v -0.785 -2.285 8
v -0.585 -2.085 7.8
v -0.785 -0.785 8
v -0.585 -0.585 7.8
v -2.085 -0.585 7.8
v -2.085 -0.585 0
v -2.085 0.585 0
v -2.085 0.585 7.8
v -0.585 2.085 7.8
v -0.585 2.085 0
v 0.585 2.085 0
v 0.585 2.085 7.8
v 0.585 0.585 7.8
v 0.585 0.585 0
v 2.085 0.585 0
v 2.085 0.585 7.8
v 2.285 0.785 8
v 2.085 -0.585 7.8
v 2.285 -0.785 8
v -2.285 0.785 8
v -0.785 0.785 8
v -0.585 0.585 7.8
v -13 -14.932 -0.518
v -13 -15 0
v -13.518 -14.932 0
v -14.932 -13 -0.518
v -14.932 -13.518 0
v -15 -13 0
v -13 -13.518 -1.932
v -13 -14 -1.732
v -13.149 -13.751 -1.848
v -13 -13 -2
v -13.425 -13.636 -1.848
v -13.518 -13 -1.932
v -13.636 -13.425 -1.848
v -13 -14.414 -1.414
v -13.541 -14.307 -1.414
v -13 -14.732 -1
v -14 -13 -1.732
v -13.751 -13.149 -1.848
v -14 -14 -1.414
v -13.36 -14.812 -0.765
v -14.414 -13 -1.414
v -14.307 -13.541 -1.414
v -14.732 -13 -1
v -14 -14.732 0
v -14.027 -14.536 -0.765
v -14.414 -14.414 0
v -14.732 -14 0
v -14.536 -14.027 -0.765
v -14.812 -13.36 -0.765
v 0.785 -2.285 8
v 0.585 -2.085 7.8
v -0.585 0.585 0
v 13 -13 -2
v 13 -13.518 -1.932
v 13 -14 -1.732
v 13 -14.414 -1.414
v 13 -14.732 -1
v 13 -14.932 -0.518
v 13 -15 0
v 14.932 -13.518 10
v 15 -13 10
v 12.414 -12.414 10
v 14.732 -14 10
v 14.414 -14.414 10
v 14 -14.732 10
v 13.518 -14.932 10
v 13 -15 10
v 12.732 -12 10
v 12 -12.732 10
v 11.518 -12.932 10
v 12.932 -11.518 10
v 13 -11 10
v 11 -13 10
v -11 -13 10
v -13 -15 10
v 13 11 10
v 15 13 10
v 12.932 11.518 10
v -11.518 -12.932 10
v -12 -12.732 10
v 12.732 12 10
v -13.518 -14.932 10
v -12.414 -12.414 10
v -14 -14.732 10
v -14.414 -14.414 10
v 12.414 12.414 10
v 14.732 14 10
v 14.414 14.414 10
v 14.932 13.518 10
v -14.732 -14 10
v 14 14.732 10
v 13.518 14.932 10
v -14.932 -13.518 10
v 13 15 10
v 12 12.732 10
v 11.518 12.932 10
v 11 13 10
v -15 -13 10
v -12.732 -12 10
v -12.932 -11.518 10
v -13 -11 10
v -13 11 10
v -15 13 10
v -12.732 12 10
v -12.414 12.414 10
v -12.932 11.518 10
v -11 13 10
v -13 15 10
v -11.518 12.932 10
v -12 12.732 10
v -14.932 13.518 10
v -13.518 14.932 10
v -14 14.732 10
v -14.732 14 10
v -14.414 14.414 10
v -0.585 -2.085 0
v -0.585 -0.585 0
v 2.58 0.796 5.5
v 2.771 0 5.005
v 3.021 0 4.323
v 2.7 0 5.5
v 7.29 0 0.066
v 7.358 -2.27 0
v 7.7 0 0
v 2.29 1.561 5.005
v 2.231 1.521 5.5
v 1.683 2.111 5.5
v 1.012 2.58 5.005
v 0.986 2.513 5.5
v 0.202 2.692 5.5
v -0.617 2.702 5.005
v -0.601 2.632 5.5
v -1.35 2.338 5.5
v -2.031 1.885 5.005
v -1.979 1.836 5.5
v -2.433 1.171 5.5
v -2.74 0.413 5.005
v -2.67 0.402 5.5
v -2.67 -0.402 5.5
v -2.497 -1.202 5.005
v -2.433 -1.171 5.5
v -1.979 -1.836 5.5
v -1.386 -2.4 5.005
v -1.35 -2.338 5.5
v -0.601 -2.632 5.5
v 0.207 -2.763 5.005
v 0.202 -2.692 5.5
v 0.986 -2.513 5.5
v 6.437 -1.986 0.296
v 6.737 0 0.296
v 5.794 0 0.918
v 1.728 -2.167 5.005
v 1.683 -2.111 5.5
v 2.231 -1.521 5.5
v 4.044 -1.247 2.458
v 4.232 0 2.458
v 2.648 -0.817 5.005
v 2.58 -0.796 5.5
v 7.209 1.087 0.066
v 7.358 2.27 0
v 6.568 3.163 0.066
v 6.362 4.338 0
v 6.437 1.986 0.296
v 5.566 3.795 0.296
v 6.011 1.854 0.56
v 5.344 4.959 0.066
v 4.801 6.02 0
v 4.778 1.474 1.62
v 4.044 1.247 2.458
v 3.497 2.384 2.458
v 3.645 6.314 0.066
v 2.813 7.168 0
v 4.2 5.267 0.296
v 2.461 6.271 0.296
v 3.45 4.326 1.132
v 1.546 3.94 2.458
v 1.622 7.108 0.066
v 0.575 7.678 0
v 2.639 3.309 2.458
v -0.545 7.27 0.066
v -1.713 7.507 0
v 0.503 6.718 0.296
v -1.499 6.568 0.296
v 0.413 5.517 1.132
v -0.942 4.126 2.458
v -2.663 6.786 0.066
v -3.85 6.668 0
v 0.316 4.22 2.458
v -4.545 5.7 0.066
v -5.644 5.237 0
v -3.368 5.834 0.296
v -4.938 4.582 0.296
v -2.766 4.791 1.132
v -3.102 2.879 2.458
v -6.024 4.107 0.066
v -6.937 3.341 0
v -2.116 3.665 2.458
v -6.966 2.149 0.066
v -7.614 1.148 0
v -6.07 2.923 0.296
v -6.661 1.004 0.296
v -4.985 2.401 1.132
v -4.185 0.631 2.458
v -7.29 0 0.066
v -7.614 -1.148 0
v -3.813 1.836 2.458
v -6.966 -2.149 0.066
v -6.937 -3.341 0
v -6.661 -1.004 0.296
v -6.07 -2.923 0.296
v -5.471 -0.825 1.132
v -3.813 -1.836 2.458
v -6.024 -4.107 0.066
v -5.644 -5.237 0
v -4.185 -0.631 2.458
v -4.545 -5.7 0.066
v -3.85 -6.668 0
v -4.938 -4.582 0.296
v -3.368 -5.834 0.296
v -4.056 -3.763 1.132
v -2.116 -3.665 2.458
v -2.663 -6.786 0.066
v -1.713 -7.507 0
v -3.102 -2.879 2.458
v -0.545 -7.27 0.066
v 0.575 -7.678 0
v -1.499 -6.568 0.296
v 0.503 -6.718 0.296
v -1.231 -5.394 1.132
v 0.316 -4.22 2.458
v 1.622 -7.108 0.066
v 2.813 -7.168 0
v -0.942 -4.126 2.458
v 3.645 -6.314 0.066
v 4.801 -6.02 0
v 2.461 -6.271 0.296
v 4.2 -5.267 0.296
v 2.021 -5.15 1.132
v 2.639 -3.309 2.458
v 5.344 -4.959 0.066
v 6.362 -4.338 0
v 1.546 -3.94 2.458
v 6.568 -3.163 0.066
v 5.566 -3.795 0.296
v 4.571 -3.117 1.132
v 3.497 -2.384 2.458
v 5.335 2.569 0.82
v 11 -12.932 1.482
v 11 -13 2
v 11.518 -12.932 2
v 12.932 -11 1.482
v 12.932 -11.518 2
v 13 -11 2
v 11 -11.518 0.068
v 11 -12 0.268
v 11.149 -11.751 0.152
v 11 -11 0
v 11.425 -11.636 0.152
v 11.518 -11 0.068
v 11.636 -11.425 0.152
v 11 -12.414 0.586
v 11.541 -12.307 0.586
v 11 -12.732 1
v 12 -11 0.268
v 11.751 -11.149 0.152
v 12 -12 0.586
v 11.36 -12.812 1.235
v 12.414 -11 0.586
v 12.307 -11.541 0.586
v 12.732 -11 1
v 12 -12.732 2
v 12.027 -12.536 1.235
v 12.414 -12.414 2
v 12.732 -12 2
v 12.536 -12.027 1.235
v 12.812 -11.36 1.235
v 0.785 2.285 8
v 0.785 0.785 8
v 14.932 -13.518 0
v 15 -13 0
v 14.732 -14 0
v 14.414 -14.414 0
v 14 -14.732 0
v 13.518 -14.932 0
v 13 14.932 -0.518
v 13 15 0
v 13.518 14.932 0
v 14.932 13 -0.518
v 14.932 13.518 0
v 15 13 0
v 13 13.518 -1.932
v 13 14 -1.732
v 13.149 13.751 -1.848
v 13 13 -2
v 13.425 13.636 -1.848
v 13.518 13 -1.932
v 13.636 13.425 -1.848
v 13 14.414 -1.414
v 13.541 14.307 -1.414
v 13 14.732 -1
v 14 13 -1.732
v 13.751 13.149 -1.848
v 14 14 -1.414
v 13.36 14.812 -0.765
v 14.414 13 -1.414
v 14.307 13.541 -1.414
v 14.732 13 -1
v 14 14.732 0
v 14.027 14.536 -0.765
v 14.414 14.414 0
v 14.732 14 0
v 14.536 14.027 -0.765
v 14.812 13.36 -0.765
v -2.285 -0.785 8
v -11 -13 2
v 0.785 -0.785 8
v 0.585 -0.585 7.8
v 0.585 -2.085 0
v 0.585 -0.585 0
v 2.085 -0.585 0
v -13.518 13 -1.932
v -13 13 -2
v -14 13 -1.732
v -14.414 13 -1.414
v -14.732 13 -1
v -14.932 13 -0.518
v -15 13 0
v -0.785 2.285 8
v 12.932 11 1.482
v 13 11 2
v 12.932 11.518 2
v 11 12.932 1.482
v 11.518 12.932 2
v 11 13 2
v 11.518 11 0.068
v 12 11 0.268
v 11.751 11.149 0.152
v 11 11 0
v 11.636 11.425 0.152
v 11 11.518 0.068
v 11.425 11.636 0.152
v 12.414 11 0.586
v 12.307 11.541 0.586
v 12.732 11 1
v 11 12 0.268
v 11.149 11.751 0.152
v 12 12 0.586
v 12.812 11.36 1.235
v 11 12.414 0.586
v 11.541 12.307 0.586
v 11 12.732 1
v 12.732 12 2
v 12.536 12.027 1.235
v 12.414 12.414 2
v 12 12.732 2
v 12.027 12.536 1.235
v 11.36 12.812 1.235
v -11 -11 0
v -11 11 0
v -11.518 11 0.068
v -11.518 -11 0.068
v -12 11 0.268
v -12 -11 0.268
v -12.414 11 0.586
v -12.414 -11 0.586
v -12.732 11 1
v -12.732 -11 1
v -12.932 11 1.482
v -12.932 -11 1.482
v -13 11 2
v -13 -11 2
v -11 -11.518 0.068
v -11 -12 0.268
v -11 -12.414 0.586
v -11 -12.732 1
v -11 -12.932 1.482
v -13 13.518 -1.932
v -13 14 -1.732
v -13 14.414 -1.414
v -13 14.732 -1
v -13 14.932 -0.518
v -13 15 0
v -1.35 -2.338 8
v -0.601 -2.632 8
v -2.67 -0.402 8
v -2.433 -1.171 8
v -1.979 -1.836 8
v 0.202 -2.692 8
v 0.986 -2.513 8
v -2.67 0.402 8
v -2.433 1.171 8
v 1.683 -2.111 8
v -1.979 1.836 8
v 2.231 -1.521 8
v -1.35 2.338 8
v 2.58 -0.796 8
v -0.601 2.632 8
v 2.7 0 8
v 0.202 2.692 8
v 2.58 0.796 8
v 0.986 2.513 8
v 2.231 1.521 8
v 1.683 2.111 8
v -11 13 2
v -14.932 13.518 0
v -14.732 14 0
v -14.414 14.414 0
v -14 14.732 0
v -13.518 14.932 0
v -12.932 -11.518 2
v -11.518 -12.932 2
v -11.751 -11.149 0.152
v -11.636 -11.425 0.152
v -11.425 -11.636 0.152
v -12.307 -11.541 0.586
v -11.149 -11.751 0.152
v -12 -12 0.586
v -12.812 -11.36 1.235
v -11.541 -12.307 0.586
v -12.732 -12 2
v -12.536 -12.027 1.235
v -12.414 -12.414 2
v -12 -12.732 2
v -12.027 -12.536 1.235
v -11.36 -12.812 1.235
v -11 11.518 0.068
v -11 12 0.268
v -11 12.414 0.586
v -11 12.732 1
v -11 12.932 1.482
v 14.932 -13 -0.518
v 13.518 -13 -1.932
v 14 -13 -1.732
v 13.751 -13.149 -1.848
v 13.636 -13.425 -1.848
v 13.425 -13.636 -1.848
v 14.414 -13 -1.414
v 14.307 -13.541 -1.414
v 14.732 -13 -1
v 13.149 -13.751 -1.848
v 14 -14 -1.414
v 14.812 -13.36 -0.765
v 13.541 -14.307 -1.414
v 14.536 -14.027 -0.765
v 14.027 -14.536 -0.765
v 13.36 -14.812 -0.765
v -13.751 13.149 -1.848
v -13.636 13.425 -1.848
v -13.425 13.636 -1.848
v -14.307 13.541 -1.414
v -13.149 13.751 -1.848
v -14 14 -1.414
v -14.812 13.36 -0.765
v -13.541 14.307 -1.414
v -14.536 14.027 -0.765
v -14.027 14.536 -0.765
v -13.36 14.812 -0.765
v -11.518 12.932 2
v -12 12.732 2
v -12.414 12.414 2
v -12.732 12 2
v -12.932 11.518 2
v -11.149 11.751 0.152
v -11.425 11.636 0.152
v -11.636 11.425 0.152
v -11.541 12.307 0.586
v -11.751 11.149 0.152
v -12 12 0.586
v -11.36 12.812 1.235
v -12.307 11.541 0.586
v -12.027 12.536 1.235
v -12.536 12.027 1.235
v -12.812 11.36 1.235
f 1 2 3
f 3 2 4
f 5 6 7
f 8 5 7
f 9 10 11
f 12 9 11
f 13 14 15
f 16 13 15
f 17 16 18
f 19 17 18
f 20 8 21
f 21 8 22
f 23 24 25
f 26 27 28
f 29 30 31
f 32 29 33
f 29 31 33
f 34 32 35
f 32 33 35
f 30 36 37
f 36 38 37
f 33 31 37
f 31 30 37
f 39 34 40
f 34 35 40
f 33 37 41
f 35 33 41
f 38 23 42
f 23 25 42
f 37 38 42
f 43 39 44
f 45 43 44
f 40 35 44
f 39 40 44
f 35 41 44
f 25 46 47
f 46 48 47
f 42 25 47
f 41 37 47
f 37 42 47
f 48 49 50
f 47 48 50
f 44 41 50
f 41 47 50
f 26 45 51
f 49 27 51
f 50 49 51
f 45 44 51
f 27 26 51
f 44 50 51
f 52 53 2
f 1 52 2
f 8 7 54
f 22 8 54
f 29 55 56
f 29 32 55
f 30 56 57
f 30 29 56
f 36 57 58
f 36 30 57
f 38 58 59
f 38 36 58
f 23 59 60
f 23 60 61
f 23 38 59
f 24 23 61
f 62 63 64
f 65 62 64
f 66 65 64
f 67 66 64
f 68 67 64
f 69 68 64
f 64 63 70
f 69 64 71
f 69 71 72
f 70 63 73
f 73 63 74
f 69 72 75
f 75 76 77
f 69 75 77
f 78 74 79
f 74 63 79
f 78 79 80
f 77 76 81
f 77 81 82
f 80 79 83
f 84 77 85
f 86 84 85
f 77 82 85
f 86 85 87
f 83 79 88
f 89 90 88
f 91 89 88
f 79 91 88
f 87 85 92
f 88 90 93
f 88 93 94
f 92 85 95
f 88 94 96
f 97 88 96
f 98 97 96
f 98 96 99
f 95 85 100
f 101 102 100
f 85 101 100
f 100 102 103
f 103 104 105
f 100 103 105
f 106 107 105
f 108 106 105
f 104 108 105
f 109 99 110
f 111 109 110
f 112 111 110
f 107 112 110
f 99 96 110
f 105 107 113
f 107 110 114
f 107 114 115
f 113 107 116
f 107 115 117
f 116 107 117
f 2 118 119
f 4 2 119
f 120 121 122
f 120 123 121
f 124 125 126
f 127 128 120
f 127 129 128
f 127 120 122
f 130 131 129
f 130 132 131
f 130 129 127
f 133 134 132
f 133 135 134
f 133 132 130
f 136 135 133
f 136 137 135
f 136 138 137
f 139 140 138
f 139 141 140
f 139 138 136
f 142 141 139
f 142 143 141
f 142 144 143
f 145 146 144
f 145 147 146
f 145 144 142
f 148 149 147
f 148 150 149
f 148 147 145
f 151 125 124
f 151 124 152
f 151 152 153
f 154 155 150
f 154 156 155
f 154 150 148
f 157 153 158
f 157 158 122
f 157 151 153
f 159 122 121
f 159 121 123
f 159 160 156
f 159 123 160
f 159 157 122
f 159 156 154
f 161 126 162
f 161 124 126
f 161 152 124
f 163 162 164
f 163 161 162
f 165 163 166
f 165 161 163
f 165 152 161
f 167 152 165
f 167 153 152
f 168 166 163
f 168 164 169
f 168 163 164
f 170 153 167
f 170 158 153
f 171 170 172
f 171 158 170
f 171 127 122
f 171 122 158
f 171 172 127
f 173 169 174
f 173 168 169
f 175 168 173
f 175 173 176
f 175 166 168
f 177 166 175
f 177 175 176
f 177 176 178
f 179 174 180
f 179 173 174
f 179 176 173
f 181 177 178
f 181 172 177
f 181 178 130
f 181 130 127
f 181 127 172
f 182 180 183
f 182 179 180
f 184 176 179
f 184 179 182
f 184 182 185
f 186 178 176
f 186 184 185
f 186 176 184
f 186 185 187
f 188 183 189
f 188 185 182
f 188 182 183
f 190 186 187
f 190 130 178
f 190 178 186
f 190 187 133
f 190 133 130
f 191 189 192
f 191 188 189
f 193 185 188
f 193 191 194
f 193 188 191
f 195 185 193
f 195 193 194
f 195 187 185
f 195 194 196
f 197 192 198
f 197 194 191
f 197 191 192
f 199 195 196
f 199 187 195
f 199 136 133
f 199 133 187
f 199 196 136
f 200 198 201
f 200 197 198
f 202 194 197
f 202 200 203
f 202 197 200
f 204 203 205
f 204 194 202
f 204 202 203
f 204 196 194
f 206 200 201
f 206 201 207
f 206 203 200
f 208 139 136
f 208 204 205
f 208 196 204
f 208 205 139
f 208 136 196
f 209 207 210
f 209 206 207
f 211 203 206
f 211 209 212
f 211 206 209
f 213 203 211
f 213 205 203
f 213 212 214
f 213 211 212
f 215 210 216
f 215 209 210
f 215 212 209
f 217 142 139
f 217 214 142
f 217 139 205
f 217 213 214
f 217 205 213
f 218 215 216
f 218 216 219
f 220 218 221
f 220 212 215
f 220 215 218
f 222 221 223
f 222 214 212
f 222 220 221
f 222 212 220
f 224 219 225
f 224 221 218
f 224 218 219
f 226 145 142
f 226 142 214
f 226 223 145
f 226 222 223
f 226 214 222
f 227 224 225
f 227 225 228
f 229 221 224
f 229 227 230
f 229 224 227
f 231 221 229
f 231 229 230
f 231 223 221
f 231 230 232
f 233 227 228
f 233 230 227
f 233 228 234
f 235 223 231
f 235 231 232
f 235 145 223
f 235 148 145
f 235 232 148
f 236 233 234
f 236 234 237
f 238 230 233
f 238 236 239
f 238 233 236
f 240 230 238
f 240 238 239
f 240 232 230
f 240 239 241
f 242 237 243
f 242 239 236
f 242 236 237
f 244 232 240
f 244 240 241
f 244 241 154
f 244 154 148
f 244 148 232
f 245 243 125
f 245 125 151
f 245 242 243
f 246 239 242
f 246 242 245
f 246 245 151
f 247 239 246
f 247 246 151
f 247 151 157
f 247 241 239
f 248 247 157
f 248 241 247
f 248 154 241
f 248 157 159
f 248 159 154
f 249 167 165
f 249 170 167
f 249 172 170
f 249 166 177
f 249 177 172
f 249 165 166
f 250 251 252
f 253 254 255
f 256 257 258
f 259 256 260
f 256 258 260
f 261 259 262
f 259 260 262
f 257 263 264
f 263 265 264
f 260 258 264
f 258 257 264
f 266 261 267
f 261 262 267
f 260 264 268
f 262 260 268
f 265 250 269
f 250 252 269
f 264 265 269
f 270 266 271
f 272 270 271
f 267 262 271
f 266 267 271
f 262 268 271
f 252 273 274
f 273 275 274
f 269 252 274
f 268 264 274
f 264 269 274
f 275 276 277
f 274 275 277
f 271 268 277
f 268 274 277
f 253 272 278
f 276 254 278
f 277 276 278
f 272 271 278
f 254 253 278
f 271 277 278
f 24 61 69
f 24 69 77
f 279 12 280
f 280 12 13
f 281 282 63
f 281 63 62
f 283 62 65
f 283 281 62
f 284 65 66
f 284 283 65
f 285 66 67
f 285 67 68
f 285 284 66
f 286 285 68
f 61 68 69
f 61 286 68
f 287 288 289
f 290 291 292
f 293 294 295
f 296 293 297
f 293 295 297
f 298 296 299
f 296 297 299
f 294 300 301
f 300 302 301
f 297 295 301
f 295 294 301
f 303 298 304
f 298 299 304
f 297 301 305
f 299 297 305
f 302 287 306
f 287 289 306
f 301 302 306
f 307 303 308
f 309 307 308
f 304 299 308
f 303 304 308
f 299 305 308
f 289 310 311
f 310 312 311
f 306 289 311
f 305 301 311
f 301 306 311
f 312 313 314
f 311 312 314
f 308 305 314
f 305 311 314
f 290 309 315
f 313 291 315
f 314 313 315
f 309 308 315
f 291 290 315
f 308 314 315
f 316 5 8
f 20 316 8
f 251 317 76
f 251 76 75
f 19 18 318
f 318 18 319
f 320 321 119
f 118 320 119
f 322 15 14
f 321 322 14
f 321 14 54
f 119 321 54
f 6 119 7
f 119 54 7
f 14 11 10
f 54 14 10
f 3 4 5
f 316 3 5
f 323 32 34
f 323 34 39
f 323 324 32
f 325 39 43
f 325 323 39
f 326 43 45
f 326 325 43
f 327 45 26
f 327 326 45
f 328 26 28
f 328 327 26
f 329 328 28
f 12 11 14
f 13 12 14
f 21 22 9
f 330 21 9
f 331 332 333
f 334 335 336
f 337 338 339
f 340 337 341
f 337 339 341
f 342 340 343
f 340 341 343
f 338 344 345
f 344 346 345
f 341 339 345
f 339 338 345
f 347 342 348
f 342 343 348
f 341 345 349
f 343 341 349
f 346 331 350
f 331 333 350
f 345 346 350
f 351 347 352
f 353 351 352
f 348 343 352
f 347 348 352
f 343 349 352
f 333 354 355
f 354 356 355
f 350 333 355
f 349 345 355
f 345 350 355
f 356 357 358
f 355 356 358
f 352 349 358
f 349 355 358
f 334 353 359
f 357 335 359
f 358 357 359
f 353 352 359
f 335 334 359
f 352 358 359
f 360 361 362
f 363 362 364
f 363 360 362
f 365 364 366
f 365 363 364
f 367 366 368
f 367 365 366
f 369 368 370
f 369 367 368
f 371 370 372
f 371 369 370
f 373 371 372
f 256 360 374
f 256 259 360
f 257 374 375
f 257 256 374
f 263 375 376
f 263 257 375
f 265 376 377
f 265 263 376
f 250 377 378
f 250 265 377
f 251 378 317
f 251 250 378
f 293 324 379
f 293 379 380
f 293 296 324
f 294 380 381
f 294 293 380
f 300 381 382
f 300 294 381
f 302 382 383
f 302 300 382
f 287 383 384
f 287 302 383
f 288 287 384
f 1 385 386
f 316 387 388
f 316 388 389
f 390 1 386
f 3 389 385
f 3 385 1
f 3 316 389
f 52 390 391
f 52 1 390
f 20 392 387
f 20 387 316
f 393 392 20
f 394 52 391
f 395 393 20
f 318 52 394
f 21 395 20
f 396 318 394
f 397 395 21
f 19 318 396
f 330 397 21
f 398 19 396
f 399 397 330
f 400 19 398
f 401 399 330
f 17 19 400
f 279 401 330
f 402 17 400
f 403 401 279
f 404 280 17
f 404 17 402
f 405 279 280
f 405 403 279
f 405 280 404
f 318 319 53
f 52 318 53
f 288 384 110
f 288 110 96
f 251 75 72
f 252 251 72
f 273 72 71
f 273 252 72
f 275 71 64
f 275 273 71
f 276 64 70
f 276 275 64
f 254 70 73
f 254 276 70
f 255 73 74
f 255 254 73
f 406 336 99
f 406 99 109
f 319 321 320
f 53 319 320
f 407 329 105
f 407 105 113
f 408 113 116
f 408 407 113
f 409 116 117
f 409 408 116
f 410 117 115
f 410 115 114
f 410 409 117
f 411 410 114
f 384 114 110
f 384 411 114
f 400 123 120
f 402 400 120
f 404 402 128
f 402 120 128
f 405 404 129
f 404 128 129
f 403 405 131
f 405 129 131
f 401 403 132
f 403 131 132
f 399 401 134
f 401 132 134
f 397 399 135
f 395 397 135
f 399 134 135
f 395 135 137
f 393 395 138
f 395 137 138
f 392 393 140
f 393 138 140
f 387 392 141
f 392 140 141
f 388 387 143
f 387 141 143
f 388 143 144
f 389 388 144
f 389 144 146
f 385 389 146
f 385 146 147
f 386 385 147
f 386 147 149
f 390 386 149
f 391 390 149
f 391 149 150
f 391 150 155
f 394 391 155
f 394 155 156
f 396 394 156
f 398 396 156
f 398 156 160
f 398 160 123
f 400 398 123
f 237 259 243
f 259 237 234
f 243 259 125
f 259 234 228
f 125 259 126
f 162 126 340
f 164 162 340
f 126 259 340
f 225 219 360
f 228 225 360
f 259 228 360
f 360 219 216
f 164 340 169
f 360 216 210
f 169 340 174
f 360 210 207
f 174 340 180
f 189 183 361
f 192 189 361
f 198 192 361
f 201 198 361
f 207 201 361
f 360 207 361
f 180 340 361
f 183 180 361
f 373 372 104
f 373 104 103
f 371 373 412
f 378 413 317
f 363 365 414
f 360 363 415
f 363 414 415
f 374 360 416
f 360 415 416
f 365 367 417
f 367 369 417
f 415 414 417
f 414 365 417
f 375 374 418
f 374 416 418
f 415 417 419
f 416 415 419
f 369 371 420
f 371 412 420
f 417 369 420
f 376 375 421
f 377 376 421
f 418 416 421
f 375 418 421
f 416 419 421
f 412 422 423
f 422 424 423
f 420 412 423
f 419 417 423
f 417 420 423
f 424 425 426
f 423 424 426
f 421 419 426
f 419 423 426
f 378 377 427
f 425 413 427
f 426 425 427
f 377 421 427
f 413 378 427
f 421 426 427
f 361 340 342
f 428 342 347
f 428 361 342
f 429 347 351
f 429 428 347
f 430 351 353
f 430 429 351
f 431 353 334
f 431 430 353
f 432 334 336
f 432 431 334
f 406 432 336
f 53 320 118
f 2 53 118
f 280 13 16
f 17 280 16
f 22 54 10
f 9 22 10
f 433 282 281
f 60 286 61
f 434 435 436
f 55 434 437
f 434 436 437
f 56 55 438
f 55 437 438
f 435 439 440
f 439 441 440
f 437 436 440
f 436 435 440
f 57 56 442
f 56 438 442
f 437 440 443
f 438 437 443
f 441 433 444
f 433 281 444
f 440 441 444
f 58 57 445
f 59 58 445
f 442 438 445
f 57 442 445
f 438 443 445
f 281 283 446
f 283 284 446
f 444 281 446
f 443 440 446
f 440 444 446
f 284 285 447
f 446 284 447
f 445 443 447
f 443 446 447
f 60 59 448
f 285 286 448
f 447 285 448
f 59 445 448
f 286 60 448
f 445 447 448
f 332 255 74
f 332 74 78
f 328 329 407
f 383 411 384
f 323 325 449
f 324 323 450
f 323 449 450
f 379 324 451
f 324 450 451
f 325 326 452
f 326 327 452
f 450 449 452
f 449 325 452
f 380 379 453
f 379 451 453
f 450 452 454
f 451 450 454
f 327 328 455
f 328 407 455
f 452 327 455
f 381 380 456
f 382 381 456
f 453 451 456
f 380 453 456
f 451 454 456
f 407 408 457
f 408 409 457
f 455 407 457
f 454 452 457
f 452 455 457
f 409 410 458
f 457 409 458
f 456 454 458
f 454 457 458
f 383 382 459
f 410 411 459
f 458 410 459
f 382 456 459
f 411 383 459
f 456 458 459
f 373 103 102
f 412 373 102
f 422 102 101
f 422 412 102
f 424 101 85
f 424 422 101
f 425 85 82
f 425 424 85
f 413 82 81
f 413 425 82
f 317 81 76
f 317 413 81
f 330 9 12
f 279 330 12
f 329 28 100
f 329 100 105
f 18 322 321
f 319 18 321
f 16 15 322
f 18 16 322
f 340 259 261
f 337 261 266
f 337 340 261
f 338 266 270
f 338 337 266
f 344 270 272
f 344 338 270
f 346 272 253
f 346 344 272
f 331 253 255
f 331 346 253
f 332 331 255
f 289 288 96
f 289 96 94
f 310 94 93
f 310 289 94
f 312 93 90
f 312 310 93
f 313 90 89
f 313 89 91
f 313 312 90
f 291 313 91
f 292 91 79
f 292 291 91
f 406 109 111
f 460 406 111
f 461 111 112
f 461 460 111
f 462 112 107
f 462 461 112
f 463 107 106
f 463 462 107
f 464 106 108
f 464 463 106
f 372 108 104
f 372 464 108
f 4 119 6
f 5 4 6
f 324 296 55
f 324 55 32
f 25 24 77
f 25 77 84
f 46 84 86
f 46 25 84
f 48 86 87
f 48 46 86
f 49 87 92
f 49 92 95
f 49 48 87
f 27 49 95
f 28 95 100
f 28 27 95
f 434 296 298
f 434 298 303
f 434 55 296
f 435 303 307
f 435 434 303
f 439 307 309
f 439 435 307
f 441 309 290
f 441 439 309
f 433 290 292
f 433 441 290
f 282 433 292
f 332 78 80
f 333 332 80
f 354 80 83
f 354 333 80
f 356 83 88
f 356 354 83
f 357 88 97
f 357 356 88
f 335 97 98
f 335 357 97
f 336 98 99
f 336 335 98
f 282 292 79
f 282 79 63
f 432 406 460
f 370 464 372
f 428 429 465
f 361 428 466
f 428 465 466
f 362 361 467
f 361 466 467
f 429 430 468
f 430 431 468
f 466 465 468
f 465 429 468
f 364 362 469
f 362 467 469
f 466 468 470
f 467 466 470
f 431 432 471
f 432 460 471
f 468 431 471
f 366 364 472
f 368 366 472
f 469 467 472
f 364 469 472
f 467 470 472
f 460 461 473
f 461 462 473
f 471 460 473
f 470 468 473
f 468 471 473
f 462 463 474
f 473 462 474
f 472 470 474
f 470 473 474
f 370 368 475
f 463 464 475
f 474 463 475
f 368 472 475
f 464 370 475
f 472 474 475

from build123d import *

# Parameters (mm, degrees)
EXTRUDE_1_DEPTH = 10
SKETCH_1_6_R    = 2.7
EXTRUDE_2_DEPTH = 8
EXTRUDE_START   = -2
EXTRUDE_3_DEPTH = 2
FILLET_1_R      = 2
CHAMFER_1_SIZE  = 0.2
FILLET_2_R      = 2
FILLET_3_SIZE   = 5
FILLET_3_SIZE_2 = 5.5


with BuildPart() as part:
    # 草图1 → 凸台-拉伸1 (new body)
    with BuildSketch(Plane.XY):
        with BuildLine():
            ThreePointArc((-15, 13), (-14.414213562, 14.414213562), (-13, 15))
            Line((-13, 15), (13, 15))
            ThreePointArc((13, 15), (14.414213562, 14.414213562), (15, 13))
            Line((15, 13), (15, -13))
            ThreePointArc((15, -13), (14.414213562, -14.414213562), (13, -15))
            Line((13, -15), (-13, -15))
            ThreePointArc((-13, -15), (-14.414213562, -14.414213562), (-15, -13))
            Line((-15, -13), (-15, 13))
        make_face()
        with BuildLine():
            ThreePointArc((-13, -11), (-12.414213562, -12.414213562), (-11, -13))
            Line((-11, -13), (11, -13))
            ThreePointArc((11, -13), (12.414213562, -12.414213562), (13, -11))
            Line((13, -11), (13, 11))
            ThreePointArc((13, 11), (12.414213562, 12.414213562), (11, 13))
            Line((11, 13), (-11, 13))
            ThreePointArc((-11, 13), (-12.414213562, 12.414213562), (-13, 11))
            Line((-13, 11), (-13, -11))
        make_face(mode=Mode.SUBTRACT)
    extrude(amount=EXTRUDE_1_DEPTH)



with BuildPart() as body_2:
    # 草图1<6> → 凸台-拉伸2 (new body)
    with BuildSketch(Plane.XY):
        Circle(SKETCH_1_6_R)
        Polygon((-2.085, -0.585), (-2.085, 0.585), (-0.585, 0.585), (-0.585, 2.085), (0.585, 2.085), (0.585, 0.585), (2.085, 0.585), (2.085, -0.585), (0.585, -0.585), (0.585, -2.085), (-0.585, -2.085), (-0.585, -0.585), align=None, mode=Mode.SUBTRACT)
    extrude(amount=EXTRUDE_2_DEPTH)


with BuildPart() as part_1:
    add(part.part)

    add(body_2.part)  # 凸台-拉伸3 merges body 2
    # 草图1<7> → 凸台-拉伸3 (add)
    with BuildSketch(Plane.XY.offset(EXTRUDE_START)):
        with BuildLine():
            Line((-13, 15), (13, 15))
            ThreePointArc((13, 15), (14.414213562, 14.414213562), (15, 13))
            Line((15, 13), (15, -13))
            ThreePointArc((15, -13), (14.414213562, -14.414213562), (13, -15))
            Line((13, -15), (-13, -15))
            ThreePointArc((-13, -15), (-14.414213562, -14.414213562), (-15, -13))
            Line((-15, -13), (-15, 13))
            ThreePointArc((-15, 13), (-14.414213562, 14.414213562), (-13, 15))
        make_face()
    extrude(amount=EXTRUDE_3_DEPTH)

    # 圆角1
    fillet_1_edges = [part_1.edges().sort_by_distance(p)[0] for p in [
        (-14.414213562, -14.414213562, -2),
        (-15, 0, -2),
        (14.414213562, 14.414213562, -2),
        (14.414213562, -14.414213562, -2),
        (0, -15, -2),
        (-14.414213562, 14.414213562, -2),
        (0, 15, -2),
        (15, 0, -2),
    ]]
    fillet(fillet_1_edges, radius=FILLET_1_R)

    # 倒角1
    chamfer_1_edges = [part_1.edges().sort_by_distance(p)[0] for p in [
        (1.335, -0.585, 8),
        (0, -2.085, 8),
        (-0.585, -1.335, 8),
        (-1.335, -0.585, 8),
        (-2.085, 0, 8),
        (-0.585, 1.335, 8),
        (0, 2.085, 8),
        (0.585, 1.335, 8),
        (1.335, 0.585, 8),
        (2.085, 0, 8),
        (0.585, -1.335, 8),
        (-1.335, 0.585, 8),
    ]]
    chamfer(chamfer_1_edges, length=CHAMFER_1_SIZE)

    # 圆角2
    fillet_2_edges = [part_1.edges().sort_by_distance(p)[0] for p in [
        (0, -13, 0),
        (12.414213562, -12.414213562, 0),
        (13, 0, 0),
        (12.414213562, 12.414213562, 0),
        (0, 13, 0),
        (-12.414213562, 12.414213562, 0),
        (-13, 0, 0),
        (-12.414213562, -12.414213562, 0),
    ]]
    fillet(fillet_2_edges, radius=FILLET_2_R)

    # 圆角3
    # a fillet whose section is not a circle: 5.5, 5 mm, written as the material it adds along each edge
    with BuildSketch(Plane(origin=(0, 0, 0), x_dir=(1, 0, 0), z_dir=(0, -1, 0))) as fillet_3_piece_1:
        with BuildLine():
            Bezier((2.7 + FILLET_3_SIZE, 0), (2.7, 0), (2.7, FILLET_3_SIZE_2), weights=[1, 0.333333333, 1])
            Line((2.7, FILLET_3_SIZE_2), (2.7, 0))
            Line((2.7, 0), (2.7 + FILLET_3_SIZE, 0))
        make_face()
    revolve(axis=Axis((0, 0, 0), (0, 0, 1)))


solid = part_1.part
